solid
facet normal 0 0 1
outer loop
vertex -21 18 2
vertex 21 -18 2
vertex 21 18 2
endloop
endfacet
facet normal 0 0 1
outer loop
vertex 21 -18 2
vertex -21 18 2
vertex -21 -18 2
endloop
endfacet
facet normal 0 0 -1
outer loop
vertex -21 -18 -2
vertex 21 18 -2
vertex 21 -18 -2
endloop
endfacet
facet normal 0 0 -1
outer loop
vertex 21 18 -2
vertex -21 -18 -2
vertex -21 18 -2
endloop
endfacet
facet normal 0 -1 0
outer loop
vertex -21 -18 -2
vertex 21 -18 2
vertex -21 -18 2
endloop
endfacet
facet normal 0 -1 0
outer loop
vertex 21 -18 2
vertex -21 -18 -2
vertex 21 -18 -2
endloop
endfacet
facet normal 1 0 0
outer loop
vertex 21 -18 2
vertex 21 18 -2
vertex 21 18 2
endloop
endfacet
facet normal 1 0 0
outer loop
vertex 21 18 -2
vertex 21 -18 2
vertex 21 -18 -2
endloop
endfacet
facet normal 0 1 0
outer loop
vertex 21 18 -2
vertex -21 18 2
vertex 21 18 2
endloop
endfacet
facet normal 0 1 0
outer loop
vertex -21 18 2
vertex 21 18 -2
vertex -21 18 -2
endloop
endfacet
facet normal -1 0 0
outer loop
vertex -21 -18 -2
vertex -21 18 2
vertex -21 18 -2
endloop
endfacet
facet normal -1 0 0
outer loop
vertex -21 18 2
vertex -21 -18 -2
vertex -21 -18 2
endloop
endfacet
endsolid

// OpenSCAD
module battery()
    color("silver") cube([42,36,4], true);
    
battery();
